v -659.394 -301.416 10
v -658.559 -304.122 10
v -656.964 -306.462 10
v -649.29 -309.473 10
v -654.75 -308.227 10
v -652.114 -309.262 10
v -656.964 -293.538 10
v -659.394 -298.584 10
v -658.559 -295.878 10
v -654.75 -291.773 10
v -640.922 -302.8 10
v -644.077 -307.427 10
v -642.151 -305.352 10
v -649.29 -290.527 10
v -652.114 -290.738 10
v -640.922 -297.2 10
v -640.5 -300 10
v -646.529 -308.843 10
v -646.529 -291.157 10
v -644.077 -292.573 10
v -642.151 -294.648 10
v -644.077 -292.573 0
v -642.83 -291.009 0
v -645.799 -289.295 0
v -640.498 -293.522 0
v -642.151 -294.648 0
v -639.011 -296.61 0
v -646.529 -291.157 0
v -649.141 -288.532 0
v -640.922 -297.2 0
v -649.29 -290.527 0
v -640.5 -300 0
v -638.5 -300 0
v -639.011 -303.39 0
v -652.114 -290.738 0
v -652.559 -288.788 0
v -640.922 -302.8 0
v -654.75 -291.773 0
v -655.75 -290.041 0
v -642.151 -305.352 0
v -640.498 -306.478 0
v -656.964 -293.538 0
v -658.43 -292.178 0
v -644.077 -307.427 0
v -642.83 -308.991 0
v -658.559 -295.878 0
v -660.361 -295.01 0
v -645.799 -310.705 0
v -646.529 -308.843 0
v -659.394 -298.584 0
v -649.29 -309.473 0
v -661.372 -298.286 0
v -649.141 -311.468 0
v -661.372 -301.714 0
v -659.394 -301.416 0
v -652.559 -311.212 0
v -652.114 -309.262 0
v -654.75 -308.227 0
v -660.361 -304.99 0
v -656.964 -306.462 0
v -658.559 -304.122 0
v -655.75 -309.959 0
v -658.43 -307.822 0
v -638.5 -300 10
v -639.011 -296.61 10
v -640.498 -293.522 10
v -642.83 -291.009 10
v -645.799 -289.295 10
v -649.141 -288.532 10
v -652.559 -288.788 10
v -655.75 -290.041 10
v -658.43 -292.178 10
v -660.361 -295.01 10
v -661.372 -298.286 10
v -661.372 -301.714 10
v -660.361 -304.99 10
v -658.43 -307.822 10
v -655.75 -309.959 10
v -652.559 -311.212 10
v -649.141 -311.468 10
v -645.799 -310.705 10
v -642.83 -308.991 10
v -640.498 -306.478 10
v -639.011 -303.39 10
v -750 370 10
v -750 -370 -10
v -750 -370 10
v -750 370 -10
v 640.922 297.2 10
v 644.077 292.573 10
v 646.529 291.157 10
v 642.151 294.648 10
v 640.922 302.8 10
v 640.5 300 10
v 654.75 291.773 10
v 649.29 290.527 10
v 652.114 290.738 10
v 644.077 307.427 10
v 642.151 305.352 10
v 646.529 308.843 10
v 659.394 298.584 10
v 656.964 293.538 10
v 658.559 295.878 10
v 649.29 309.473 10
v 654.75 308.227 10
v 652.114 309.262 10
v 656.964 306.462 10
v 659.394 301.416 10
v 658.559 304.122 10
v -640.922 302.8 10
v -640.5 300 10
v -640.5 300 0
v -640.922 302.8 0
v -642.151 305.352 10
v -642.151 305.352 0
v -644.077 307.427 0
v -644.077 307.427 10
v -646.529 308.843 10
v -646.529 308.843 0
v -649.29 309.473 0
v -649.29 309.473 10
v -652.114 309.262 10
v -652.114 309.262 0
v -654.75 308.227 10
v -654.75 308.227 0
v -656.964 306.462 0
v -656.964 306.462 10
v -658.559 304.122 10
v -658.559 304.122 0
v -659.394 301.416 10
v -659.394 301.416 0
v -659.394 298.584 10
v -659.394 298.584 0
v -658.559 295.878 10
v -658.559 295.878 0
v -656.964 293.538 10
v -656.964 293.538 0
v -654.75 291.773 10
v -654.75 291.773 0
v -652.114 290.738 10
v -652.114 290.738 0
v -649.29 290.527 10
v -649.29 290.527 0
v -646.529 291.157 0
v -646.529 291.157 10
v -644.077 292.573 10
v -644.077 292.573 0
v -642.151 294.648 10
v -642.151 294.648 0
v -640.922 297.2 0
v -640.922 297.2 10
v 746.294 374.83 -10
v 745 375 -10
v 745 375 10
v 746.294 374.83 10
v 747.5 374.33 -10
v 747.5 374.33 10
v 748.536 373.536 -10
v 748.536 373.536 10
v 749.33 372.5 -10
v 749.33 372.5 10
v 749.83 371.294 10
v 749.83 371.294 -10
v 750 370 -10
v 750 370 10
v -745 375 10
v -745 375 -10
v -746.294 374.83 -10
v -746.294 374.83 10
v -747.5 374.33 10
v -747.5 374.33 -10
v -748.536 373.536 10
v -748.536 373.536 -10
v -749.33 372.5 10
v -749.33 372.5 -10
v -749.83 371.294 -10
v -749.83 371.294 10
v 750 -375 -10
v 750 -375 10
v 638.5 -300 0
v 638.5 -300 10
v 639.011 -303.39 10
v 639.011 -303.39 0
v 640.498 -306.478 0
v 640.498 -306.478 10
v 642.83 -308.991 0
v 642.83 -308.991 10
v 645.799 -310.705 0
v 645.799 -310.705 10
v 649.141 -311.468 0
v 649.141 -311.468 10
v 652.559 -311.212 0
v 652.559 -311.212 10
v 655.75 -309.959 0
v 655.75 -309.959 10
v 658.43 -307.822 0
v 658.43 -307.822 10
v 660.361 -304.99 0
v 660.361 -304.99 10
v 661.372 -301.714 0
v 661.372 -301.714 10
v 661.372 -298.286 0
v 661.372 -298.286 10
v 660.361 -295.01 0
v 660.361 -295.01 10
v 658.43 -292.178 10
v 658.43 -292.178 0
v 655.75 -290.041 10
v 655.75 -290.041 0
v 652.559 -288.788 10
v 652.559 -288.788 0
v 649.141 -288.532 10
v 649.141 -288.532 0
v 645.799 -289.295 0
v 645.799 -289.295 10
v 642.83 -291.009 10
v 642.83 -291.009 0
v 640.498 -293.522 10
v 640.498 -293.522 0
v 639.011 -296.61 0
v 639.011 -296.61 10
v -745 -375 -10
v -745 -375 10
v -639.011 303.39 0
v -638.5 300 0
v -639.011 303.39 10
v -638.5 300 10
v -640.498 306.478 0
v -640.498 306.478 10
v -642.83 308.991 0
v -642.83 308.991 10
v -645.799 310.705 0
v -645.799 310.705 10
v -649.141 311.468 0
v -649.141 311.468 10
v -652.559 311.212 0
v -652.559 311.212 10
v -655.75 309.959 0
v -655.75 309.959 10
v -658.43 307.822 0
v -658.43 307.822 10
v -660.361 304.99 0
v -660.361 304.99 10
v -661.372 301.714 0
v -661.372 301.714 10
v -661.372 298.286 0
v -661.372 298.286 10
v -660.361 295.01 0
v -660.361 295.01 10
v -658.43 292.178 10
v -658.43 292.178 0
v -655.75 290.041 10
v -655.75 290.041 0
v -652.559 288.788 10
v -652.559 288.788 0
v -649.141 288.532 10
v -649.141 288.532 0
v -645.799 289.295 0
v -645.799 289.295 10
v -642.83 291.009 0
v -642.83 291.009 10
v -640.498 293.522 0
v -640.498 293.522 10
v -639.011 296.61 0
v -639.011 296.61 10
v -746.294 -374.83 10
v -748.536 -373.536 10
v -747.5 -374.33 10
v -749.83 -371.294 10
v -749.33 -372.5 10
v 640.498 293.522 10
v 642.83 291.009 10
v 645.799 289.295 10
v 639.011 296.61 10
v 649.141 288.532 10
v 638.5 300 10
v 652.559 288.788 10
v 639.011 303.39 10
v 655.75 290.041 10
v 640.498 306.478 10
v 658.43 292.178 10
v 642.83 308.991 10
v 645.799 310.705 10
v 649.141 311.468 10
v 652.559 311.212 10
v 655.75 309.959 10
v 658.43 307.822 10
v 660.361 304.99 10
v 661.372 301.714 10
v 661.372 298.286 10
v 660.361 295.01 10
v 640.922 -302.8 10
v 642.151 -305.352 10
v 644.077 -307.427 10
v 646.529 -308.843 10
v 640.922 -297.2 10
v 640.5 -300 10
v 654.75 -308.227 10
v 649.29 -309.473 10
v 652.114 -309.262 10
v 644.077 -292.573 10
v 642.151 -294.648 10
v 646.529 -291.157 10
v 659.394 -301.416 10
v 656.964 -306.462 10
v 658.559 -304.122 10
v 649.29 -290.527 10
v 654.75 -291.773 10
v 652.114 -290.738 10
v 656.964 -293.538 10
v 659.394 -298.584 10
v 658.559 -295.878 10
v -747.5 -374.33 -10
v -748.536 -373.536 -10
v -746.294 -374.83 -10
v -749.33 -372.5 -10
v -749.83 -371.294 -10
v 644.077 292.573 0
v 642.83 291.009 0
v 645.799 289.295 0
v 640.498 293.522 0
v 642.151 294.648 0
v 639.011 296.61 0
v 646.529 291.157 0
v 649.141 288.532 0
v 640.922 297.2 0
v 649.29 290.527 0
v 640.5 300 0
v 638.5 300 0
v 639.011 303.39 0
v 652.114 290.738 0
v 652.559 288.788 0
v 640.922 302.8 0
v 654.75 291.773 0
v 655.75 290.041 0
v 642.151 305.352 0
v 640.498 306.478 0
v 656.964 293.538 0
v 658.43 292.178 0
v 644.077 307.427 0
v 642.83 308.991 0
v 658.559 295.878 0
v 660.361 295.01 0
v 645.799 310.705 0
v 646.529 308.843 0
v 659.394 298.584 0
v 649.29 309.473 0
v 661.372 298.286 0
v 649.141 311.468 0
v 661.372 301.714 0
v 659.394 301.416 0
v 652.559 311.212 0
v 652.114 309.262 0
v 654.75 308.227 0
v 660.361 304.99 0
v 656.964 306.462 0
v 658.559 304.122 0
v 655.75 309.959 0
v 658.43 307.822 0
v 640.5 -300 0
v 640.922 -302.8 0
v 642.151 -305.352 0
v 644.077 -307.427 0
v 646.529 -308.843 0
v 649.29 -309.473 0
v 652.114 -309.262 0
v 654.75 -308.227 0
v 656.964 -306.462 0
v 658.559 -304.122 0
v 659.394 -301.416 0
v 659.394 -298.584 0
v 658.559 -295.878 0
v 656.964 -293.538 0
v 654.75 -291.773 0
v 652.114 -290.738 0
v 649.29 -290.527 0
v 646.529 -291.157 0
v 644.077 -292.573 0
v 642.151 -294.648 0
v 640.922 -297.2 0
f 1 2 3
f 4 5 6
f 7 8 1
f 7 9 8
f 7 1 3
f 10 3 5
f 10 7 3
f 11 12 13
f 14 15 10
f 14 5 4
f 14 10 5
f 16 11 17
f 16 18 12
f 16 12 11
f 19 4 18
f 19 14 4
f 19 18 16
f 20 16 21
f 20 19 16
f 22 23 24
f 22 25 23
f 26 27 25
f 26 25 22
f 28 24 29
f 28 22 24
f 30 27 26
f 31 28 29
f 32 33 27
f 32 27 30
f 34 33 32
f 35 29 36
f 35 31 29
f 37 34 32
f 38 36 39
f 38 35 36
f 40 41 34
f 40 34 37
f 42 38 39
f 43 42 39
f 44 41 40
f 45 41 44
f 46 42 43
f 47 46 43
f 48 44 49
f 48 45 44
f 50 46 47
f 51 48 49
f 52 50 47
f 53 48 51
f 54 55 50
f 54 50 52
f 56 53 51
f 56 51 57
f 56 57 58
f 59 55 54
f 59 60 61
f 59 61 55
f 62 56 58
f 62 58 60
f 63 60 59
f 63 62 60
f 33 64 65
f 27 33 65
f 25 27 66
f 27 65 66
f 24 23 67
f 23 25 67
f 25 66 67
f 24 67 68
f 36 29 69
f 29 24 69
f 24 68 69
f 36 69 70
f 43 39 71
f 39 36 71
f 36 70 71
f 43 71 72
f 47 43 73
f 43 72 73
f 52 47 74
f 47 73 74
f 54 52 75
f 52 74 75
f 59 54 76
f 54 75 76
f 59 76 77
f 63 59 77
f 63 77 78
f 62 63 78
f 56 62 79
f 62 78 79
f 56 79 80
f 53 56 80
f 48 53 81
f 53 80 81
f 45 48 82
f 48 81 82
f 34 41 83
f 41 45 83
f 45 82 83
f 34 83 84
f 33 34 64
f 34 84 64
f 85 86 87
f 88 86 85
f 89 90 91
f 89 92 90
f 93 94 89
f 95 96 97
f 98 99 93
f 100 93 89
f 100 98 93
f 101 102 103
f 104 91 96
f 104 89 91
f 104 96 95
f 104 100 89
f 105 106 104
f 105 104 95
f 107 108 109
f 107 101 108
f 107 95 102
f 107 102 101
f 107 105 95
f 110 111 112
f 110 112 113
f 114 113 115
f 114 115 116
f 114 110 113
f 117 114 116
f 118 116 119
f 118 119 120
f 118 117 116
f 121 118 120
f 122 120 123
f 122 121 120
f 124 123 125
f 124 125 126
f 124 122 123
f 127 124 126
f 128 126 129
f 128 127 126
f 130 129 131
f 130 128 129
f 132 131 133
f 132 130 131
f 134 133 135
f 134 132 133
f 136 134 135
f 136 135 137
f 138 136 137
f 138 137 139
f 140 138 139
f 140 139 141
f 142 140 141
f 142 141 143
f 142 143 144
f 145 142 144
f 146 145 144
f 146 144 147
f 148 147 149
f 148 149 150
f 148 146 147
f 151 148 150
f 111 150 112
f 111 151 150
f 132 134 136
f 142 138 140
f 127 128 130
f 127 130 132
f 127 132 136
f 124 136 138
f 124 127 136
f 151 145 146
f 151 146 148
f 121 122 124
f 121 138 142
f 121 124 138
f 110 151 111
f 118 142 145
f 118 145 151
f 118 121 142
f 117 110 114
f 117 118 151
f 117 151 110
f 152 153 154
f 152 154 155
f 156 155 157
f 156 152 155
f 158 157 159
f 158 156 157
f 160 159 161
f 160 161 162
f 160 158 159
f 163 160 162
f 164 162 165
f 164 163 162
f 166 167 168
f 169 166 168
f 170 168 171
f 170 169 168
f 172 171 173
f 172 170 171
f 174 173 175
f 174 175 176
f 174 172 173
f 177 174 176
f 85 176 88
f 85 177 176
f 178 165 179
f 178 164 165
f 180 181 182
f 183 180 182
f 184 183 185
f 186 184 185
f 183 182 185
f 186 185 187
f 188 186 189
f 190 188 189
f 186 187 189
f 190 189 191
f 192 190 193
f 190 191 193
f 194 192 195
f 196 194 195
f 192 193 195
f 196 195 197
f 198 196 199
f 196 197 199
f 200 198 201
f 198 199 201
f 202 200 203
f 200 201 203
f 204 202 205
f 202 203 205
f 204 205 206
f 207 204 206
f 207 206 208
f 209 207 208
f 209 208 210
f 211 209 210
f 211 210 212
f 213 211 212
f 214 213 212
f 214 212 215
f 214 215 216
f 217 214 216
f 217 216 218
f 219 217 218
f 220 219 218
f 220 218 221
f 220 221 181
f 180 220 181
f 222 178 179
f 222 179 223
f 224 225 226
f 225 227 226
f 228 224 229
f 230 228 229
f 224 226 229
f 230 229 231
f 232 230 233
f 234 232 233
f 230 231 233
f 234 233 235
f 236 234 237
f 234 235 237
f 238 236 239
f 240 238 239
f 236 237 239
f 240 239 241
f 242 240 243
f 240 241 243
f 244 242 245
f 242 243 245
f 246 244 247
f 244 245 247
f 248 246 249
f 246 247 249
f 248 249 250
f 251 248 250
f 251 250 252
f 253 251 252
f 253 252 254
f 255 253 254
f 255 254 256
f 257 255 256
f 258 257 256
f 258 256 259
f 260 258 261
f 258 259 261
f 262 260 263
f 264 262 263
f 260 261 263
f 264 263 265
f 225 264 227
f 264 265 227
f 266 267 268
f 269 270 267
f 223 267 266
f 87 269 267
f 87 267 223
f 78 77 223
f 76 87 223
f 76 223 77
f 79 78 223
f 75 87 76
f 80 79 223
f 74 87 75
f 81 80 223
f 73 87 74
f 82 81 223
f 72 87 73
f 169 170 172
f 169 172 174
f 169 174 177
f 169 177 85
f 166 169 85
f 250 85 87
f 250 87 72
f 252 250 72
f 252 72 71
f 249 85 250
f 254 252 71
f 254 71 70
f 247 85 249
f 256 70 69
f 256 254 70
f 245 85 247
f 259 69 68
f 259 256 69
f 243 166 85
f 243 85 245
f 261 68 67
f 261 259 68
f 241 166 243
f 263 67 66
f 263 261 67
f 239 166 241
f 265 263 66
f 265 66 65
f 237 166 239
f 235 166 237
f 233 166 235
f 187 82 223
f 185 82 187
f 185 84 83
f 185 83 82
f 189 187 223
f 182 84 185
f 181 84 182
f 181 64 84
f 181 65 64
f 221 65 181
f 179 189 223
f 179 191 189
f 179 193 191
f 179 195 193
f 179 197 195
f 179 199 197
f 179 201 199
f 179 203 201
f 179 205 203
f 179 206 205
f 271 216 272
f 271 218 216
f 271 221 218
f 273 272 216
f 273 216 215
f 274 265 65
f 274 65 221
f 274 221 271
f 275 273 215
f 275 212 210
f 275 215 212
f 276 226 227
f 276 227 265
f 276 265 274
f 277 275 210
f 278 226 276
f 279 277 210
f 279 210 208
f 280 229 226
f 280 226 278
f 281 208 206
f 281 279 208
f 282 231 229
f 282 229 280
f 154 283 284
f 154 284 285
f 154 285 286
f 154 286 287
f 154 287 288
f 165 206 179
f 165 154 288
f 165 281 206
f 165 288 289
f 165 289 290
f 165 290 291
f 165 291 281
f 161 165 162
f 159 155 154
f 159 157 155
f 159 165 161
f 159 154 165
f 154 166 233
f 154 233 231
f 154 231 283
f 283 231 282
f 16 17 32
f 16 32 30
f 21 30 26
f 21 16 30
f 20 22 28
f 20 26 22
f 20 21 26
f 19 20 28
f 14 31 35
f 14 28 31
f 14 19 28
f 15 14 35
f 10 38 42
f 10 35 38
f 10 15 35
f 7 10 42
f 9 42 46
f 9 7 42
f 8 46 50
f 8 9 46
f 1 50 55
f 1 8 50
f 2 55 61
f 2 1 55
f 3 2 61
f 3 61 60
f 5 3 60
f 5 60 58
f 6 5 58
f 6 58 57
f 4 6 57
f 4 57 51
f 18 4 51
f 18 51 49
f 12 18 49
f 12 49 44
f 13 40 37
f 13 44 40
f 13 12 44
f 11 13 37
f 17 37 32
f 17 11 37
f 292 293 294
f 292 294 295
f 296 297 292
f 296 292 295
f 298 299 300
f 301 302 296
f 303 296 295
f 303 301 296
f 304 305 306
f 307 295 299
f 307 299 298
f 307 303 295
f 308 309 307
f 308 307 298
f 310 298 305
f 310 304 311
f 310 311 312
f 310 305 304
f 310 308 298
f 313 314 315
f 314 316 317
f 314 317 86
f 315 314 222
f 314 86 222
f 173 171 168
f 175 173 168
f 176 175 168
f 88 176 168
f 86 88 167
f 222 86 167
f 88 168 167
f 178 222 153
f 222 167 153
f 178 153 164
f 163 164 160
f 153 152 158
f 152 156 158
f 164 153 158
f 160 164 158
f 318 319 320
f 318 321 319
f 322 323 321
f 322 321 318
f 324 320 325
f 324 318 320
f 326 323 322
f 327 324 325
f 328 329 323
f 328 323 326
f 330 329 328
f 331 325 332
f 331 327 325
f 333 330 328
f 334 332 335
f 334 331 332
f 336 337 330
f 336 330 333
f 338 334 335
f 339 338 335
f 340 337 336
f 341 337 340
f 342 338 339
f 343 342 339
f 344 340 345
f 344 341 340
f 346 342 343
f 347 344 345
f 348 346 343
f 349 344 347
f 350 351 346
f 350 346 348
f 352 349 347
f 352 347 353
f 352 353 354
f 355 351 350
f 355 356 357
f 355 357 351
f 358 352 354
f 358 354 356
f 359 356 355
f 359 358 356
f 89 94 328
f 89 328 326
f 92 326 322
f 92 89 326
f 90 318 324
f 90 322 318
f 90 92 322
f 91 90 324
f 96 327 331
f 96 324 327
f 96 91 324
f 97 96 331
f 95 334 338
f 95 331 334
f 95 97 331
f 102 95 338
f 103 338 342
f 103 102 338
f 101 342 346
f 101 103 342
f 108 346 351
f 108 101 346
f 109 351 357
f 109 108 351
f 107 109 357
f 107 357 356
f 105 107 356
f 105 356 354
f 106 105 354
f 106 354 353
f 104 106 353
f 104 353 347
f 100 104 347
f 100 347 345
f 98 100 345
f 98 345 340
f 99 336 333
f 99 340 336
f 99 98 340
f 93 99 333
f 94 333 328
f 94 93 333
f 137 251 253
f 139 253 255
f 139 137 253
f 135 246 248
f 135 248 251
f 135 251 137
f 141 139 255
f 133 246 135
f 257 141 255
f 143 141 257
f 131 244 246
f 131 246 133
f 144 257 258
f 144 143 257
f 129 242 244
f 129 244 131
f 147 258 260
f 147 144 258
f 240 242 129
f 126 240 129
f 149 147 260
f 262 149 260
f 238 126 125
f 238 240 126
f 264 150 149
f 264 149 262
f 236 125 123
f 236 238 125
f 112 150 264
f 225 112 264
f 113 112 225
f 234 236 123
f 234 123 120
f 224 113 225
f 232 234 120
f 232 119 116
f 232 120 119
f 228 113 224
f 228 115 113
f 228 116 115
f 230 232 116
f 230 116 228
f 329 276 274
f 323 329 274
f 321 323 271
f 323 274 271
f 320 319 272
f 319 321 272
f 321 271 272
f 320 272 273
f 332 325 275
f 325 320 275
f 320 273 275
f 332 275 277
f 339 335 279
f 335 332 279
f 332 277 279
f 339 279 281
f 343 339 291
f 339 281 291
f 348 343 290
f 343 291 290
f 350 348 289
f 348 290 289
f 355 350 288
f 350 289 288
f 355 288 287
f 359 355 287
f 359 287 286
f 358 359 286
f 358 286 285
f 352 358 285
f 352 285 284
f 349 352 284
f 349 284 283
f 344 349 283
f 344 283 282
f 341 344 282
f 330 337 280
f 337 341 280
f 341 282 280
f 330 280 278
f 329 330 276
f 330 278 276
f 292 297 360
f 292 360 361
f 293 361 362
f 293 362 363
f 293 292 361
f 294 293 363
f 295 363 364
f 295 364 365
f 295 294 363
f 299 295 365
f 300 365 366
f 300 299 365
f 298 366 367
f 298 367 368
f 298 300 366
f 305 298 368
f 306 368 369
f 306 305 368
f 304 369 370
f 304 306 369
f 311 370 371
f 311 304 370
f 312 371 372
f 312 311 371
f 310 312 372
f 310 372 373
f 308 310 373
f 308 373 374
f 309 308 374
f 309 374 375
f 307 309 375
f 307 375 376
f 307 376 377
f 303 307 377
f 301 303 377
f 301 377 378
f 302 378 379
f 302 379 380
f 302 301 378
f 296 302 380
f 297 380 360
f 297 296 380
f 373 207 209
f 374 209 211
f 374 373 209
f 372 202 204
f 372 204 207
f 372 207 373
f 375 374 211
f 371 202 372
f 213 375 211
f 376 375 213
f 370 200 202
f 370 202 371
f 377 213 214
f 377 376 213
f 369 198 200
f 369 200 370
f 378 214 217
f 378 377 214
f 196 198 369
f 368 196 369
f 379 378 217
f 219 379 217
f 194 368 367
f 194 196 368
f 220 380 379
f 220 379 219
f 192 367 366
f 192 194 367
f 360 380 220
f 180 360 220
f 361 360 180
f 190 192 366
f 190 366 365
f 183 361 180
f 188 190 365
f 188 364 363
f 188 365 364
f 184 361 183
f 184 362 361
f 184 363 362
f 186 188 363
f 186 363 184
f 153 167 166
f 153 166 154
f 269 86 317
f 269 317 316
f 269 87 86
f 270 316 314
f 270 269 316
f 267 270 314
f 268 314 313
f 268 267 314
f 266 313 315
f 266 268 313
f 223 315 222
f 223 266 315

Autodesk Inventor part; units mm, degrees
sketch "Esboço1" plane through (0, 0, 0) normal (0, 0, 1) x (1, 0, 0)
  line L0 (-750, 375) -> (750, 375)
  line L1 (750, 375) -> (750, -375)
  line L2 (750, -375) -> (-750, -375)
  line L3 (-750, -375) -> (-750, 375)
  line L4 (-750, 375) -> (750, -375) construction
  line L5 (750, 375) -> (-750, -375) construction
  point P0 (0, 0)
  point P1 (0, 0)
  dimension "d0" = 1500
  dimension "d1" = 750
extrude "Extrusão1" add sketch "Esboço1" along normal mid plane 20
sketch "Esboço2" plane through (0, 0, 10) normal (0, 0, 1) x (1, 0, 0)
  circle A0 centre (-650, 300) radius 9.5
  circle A1 centre (-650, 300) radius 11.5
  point P0 (0, 0)
  dimension "d4" = 19
  dimension "d5" = 650
  dimension "d6" = 300
  dimension "d11" = 23
  dimension "d12" = 2
extrude "Extrusão3" cut sketch "Esboço2" against normal blind 10
mirror "Espelhar3" about plane through (0, 0, 0) normal (1, 0, 0) of "Extrusão3"
mirror "Espelhar4" about plane through (0, 0, 0) normal (0, 1, 0) of "Extrusão3", "Espelhar3"
fillet "Arredondamento1" radius 5 1 edges at (-750, 375, 0)
mirror "Espelhar5" about plane through (0, 0, 0) normal (1, 0, 0) of "Arredondamento1"
mirror "Espelhar6" about plane through (0, 0, 0) normal (0, 1, 0) of "Arredondamento1", "Espelhar5"
equation "\"Raio_vergadura\" = Espessura"
equation "\"Largura_alívio_de_vergadura\" = Espessura"
equation "\"Profundidade_alívio_de_vergadura\" = 0.5 * Espessura"
equation "\"Tamanho_alívio_de_dobra\" = 4 * Espessura"
equation "\"Remanescente_mínimo\" = 2 * Espessura"
equation "\"Raiodetransição\" = Raio_vergadura"
equation "\"Tamanho_de_raio_de_Jacobi\" = Raio_vergadura"
equation "\"TamanhoFolga\" = Espessura"
equation "\"Espessura\" = 0.5"
properties part number "Peça9_mesa" material "Madeira (Carvalho)"
